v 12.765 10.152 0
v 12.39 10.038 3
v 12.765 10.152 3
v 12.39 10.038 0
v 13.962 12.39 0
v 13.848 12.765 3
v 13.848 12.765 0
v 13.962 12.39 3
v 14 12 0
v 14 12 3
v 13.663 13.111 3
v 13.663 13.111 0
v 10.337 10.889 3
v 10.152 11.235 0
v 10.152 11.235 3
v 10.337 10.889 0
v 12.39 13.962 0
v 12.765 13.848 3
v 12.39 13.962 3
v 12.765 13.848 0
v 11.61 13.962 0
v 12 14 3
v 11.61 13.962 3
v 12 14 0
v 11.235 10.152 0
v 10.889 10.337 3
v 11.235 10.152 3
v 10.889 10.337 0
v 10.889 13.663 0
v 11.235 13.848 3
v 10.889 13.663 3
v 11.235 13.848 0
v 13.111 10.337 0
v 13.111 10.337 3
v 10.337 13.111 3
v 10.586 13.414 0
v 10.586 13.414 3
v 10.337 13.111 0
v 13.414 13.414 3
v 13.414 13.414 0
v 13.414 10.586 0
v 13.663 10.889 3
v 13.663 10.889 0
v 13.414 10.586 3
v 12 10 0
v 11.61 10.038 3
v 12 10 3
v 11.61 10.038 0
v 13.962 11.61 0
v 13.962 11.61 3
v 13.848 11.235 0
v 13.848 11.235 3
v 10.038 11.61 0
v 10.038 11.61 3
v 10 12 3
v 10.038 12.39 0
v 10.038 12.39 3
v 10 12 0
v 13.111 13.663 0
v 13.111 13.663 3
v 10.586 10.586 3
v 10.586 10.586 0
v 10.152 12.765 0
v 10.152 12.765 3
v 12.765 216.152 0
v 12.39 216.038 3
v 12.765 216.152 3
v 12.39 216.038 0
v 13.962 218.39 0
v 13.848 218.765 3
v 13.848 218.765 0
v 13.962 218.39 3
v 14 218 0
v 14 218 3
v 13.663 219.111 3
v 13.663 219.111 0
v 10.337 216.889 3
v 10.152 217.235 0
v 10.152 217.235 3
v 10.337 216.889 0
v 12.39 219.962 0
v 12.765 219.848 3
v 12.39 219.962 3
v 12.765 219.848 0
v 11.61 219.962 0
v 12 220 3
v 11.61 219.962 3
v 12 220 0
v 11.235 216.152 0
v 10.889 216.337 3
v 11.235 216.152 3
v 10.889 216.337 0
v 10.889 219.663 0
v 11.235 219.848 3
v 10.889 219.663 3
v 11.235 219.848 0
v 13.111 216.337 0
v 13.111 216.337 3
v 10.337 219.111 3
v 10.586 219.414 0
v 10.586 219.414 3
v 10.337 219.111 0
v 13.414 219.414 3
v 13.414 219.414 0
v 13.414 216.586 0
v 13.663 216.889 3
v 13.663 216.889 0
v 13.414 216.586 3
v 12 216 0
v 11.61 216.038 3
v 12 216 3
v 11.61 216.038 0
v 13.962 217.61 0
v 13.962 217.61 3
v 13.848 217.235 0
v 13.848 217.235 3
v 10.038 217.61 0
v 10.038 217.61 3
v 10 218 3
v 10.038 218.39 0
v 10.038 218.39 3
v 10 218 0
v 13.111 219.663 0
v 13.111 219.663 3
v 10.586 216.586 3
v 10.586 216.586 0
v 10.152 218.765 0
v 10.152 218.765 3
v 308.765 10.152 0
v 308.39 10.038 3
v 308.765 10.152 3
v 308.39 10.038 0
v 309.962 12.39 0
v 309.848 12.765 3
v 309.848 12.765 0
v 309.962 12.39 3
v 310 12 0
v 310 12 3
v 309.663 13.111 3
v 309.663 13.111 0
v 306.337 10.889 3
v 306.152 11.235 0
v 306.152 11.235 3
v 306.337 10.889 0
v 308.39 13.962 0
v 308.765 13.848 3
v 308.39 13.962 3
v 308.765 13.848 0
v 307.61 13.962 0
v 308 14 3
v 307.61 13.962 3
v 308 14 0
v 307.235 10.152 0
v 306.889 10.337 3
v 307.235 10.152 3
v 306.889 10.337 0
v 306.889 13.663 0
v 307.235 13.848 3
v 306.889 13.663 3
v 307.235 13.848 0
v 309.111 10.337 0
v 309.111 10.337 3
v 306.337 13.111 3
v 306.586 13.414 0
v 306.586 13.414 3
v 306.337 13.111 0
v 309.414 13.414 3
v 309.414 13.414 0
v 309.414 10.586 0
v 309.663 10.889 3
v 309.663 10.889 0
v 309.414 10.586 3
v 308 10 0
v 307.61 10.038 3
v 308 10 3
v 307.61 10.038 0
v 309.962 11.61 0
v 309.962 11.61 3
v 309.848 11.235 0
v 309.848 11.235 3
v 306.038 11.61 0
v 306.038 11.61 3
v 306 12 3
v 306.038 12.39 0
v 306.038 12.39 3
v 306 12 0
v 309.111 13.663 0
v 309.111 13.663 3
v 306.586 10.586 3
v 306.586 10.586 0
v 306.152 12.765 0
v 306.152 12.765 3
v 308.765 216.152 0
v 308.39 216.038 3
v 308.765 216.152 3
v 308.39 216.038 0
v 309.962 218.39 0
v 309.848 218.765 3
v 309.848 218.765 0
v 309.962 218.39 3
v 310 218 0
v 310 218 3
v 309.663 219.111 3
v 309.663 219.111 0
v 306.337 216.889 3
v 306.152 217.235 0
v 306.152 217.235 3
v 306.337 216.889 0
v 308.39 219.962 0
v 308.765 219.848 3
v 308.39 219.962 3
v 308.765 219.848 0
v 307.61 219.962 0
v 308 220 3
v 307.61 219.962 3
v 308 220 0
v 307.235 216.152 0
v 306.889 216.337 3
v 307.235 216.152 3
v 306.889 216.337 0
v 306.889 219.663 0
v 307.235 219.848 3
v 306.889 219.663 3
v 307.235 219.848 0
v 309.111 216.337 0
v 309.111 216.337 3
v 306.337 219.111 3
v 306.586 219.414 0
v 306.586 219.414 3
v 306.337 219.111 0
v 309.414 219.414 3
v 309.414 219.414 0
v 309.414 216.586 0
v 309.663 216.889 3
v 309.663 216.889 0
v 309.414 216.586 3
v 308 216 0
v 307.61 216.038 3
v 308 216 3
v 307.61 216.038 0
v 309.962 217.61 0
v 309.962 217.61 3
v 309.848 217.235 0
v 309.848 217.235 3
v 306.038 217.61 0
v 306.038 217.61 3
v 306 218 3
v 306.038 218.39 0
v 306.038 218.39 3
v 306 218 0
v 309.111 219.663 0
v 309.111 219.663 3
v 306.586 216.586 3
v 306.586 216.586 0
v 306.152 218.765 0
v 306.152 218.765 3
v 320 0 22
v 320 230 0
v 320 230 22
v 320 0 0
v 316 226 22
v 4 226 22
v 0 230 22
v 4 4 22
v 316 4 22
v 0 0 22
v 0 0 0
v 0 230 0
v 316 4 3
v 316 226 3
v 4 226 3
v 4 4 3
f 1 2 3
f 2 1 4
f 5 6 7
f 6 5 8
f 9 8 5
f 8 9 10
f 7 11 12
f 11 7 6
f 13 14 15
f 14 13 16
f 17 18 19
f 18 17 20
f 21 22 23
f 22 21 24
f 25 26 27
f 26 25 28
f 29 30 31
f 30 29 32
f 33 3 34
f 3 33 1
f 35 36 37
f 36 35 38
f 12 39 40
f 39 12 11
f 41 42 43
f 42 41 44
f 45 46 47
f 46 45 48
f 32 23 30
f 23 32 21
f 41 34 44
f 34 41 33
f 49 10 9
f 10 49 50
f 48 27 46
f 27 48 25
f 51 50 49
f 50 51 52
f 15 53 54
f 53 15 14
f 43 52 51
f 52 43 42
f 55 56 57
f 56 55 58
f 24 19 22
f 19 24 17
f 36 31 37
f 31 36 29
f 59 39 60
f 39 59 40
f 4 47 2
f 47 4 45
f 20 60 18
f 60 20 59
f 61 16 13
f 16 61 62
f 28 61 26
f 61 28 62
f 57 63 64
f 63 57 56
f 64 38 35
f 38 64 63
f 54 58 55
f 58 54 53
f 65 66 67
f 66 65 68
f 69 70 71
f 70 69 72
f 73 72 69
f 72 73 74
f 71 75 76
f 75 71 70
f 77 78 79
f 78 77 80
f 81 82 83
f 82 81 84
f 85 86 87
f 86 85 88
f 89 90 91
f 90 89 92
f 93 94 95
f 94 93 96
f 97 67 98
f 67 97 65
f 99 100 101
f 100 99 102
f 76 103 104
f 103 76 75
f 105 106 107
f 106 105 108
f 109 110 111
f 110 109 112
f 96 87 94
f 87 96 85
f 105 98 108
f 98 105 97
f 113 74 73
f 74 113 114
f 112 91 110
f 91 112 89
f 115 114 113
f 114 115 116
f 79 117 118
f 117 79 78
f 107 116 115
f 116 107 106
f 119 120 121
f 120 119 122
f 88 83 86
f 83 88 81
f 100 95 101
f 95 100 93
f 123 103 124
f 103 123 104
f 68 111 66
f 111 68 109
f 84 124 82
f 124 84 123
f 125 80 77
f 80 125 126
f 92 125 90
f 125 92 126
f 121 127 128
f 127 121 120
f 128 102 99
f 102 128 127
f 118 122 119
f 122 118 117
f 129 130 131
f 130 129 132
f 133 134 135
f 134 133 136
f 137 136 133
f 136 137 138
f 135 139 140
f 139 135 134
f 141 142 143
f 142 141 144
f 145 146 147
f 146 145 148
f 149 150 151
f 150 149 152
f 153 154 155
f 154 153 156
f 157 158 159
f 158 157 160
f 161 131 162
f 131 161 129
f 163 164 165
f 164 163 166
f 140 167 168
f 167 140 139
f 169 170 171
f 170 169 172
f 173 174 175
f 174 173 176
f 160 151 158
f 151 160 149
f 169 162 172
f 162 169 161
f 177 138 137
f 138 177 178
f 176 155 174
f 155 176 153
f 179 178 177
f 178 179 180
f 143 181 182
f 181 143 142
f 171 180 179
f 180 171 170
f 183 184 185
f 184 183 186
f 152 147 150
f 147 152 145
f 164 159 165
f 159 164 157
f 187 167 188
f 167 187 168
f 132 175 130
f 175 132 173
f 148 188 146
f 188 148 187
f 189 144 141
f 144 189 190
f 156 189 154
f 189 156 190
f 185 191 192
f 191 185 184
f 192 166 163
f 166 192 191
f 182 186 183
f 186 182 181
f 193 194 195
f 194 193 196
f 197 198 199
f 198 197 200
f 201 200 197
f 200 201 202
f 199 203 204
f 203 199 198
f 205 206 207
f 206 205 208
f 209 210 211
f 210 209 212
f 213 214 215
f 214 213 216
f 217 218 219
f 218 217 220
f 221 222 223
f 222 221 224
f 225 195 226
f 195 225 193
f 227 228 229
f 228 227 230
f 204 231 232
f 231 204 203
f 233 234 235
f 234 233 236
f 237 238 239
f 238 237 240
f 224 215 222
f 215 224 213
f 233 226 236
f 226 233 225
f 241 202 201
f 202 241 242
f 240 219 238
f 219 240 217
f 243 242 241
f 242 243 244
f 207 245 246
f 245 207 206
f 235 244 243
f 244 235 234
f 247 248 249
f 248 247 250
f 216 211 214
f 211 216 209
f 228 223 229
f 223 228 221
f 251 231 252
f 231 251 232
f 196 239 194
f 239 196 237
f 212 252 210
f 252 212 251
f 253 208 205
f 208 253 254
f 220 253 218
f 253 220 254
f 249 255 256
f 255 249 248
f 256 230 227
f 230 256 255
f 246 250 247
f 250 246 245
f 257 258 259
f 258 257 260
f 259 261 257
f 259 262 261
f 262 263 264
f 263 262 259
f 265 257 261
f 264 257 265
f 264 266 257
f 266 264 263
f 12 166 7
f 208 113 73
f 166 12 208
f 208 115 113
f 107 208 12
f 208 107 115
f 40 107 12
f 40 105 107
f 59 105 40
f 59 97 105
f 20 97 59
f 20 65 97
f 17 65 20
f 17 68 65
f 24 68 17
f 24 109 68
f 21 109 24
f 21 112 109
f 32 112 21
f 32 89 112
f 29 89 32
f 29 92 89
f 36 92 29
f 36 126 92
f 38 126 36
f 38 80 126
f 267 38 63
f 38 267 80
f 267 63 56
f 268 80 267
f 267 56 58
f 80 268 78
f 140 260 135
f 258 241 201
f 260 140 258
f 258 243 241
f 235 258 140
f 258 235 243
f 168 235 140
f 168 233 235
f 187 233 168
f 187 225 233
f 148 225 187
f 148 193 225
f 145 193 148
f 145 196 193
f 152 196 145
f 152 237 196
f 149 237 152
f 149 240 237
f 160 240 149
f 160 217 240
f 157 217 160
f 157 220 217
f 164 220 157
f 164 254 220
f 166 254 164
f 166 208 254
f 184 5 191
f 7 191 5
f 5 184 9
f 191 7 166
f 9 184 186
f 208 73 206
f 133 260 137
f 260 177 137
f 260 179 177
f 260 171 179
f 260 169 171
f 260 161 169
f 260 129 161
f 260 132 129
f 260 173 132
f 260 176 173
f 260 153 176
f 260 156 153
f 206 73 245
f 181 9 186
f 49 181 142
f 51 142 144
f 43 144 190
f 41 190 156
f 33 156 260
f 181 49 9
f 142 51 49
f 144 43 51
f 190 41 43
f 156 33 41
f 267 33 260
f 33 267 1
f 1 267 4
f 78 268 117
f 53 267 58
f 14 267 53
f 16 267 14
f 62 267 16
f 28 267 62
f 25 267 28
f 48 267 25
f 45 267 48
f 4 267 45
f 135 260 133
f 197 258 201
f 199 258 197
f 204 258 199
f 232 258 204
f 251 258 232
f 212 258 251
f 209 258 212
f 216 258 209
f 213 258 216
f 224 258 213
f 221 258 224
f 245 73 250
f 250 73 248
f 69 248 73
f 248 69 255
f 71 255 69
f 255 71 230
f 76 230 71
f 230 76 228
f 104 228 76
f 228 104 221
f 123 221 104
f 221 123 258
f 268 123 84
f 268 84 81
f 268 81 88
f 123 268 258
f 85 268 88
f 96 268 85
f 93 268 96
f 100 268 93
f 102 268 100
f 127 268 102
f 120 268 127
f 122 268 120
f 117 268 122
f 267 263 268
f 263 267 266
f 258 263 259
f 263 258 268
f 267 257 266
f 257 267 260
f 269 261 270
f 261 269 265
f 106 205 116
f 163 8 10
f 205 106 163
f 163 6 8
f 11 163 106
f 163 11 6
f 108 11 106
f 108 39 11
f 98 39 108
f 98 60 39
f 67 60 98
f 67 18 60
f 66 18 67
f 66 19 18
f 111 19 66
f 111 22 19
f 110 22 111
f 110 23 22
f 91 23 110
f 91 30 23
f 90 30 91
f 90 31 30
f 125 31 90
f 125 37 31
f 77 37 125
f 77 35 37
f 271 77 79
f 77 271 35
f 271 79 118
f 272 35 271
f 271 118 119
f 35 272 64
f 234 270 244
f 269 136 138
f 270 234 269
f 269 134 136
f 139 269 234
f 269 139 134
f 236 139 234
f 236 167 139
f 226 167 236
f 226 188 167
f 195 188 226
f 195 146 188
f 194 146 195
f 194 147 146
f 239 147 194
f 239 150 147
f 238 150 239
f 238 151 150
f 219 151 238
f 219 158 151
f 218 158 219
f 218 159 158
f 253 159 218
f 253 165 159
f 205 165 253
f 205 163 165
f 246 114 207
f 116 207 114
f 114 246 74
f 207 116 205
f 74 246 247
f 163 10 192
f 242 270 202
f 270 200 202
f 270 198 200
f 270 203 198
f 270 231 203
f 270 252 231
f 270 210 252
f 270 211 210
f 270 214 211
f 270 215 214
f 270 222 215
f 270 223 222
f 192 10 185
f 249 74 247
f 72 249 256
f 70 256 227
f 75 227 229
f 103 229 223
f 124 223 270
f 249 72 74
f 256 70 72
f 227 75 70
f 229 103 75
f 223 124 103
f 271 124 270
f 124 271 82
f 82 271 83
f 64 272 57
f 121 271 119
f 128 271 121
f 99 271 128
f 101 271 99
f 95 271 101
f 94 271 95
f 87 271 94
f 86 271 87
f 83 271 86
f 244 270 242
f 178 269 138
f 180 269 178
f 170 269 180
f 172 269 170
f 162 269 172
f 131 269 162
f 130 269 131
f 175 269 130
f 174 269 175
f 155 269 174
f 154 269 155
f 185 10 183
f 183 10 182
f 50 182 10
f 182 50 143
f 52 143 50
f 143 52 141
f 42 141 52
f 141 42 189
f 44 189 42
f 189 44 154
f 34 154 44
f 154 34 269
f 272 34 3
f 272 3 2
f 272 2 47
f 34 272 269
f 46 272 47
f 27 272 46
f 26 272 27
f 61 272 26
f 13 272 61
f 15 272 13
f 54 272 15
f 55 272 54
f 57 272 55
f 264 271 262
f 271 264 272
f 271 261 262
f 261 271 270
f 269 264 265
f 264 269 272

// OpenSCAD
// Concept only. Provisional dimensions in mm.
$fn=32;
difference(){cube([320,230,22]);translate([4,4,3])cube([312,222,22]);for(x=[12,308])for(y=[12,218])translate([x,y,-1])cylinder(h=24,r=2);}
